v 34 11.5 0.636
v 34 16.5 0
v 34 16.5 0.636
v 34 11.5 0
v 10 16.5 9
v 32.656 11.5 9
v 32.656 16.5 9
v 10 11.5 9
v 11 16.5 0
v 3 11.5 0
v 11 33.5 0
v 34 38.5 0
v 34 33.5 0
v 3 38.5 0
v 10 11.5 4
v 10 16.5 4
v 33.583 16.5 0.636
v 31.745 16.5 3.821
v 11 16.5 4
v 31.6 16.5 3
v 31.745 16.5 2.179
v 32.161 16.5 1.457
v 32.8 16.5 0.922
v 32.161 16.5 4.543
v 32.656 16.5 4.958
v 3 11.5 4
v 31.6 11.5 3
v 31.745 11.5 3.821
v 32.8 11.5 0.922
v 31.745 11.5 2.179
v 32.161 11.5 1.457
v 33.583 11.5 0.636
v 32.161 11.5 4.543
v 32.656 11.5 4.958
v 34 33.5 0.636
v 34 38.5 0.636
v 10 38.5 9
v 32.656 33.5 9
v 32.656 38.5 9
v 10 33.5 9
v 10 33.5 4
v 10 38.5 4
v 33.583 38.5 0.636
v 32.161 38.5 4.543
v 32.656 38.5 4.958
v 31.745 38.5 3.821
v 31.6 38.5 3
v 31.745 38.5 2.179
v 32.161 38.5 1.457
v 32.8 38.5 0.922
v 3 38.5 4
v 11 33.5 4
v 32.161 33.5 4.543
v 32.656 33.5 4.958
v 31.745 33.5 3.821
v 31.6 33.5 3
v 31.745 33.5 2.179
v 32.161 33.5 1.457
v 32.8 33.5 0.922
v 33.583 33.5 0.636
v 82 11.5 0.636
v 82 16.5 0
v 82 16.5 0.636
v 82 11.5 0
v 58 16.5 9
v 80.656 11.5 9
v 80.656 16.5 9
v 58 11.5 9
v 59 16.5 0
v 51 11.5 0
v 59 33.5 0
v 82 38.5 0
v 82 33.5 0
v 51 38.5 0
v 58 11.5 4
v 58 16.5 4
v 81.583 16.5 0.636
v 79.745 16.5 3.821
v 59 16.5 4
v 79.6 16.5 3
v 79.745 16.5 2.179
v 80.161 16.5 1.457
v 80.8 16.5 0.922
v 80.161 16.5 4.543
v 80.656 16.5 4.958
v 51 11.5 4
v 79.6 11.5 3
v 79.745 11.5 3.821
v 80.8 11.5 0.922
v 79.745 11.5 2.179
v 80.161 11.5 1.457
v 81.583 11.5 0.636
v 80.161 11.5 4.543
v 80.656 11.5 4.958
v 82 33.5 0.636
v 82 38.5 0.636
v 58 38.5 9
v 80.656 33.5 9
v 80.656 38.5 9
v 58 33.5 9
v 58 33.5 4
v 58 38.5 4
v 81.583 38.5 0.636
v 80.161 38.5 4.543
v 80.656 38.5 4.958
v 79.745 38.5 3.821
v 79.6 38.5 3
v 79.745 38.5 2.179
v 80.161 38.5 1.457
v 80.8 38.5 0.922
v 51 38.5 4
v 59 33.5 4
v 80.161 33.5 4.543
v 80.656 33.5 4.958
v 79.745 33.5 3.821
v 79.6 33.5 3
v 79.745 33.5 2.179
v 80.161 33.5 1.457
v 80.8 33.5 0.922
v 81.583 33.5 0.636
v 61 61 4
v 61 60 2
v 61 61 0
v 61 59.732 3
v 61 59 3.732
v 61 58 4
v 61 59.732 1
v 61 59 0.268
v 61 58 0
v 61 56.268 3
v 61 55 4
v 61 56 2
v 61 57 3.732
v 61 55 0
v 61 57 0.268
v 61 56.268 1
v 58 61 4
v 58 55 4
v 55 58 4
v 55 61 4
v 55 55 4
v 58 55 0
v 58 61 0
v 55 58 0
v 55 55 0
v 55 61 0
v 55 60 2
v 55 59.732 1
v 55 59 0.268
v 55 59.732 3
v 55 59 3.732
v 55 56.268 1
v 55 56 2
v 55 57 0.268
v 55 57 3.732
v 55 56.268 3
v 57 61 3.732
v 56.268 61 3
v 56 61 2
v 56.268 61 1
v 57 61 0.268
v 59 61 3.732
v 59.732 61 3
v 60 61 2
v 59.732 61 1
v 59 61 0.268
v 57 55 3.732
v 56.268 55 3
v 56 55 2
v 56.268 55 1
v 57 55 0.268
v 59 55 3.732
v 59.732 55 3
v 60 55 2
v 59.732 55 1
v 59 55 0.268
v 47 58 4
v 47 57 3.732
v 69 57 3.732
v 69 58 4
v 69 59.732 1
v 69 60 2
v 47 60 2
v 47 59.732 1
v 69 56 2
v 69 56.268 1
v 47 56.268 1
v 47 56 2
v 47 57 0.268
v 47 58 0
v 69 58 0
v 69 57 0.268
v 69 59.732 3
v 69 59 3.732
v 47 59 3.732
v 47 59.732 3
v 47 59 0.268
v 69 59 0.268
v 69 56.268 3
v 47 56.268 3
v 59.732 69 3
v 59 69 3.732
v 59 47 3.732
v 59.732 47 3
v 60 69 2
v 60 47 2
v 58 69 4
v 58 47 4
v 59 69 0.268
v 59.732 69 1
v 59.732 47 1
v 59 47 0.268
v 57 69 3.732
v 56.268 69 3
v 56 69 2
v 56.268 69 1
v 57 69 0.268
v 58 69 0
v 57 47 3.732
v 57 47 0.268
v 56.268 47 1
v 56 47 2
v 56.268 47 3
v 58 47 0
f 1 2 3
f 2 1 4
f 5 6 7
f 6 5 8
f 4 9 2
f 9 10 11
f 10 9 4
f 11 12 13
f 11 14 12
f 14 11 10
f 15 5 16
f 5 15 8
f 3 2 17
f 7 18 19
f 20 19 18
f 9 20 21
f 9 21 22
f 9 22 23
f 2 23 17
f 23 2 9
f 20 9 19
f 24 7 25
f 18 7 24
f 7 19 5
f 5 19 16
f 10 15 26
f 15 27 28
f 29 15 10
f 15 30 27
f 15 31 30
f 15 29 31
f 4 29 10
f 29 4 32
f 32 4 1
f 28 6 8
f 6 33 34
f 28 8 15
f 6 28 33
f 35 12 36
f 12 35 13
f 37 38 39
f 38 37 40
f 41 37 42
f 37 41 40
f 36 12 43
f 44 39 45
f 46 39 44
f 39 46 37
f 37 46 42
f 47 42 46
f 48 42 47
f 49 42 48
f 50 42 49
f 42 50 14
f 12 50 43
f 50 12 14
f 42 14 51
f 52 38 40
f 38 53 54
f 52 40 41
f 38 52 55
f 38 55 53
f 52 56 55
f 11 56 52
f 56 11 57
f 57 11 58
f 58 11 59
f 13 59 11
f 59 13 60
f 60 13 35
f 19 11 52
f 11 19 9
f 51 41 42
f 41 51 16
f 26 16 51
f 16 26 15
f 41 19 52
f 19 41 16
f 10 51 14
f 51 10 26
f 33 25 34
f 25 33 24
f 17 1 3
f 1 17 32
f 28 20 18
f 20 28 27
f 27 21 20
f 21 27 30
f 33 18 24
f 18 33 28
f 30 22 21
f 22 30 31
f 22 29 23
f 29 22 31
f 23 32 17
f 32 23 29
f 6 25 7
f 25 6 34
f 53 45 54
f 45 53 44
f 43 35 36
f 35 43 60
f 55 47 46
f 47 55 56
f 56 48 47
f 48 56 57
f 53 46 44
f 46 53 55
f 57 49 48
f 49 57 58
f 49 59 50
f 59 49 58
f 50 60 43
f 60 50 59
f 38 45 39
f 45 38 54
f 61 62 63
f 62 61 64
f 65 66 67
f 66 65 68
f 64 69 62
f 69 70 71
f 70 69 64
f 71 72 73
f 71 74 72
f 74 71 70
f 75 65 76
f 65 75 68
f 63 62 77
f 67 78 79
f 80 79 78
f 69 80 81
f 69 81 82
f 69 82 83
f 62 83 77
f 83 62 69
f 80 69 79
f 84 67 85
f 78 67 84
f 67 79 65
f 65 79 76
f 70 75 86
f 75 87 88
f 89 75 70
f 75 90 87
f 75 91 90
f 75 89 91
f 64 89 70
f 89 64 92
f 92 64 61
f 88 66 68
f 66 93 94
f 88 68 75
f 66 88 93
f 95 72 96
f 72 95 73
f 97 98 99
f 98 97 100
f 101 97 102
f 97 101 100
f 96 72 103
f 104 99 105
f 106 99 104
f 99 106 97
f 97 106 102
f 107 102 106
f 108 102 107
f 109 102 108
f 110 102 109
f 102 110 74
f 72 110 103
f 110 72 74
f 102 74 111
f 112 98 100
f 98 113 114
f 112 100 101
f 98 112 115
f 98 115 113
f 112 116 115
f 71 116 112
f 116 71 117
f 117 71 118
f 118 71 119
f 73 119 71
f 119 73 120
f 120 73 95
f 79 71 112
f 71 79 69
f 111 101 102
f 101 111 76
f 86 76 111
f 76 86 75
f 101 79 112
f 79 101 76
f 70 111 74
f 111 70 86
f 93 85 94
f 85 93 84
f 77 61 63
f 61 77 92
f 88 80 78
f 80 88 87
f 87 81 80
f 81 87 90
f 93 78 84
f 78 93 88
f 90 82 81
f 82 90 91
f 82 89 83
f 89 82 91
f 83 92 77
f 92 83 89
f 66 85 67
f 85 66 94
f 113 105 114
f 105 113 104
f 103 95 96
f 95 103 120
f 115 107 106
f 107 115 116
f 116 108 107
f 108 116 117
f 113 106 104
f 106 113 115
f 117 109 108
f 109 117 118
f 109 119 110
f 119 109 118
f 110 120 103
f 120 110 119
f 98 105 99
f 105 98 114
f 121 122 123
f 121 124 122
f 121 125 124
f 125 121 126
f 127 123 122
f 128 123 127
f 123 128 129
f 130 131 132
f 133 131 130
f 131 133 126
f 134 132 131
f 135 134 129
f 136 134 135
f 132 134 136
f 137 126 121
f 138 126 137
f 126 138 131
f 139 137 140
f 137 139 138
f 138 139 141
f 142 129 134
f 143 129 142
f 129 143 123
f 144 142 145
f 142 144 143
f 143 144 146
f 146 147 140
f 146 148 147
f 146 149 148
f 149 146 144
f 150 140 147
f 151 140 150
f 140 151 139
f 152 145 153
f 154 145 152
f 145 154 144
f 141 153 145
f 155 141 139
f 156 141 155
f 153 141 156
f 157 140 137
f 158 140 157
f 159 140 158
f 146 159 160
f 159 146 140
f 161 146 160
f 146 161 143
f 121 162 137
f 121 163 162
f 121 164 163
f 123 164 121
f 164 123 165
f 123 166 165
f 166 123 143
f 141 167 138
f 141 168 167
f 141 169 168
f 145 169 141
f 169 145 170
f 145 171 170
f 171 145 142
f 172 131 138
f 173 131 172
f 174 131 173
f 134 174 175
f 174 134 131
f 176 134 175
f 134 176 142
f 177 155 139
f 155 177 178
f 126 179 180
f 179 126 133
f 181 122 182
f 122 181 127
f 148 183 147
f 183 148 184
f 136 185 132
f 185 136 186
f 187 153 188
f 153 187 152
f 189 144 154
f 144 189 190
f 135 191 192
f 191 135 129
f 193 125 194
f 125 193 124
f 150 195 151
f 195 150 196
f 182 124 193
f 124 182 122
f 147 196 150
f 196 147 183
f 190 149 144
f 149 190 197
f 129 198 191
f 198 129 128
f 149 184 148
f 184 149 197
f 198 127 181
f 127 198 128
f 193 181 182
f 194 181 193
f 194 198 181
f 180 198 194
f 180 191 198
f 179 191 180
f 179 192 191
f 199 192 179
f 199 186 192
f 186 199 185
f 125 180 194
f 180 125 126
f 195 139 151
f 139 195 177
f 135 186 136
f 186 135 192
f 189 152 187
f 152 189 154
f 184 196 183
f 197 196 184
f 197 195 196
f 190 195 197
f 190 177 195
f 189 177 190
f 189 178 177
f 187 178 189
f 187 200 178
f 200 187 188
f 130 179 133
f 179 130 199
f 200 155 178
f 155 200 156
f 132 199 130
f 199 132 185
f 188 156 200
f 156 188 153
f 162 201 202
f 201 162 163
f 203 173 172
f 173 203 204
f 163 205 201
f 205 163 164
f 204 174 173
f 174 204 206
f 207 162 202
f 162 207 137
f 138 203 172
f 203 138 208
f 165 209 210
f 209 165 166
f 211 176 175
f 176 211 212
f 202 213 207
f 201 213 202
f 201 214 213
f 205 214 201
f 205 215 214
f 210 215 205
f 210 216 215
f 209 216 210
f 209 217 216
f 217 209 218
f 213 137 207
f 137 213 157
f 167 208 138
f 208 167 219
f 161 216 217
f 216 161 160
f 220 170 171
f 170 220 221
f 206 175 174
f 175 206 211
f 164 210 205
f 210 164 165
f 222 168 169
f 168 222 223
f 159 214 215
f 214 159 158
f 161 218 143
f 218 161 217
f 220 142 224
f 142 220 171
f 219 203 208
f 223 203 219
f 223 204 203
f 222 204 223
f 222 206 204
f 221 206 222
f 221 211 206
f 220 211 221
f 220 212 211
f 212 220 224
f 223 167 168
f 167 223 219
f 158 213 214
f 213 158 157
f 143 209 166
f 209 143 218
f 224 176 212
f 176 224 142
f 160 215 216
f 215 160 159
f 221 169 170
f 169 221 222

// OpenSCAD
/*
Sample 019: Schnapp-Kardangelenk — leichtgängig
Generated from the FDM Mechanical Sample Library.
Units: millimetres.

Override examples:
  openscad -o custom.stl -D 'view="plate"' -D 'render_fn=64' model.scad
  openscad -o preview.png -D 'view="assembly"' model.scad
*/
use <../../../library/fdm_mechanisms.scad>

render_fn = is_undef(render_fn) ? 48 : render_fn;
view = is_undef(view) ? "plate" : view;
$fn = render_fn;

sample_universal_joint(
    view=view,
    clearance=0.4,
    pin_d=4
);
